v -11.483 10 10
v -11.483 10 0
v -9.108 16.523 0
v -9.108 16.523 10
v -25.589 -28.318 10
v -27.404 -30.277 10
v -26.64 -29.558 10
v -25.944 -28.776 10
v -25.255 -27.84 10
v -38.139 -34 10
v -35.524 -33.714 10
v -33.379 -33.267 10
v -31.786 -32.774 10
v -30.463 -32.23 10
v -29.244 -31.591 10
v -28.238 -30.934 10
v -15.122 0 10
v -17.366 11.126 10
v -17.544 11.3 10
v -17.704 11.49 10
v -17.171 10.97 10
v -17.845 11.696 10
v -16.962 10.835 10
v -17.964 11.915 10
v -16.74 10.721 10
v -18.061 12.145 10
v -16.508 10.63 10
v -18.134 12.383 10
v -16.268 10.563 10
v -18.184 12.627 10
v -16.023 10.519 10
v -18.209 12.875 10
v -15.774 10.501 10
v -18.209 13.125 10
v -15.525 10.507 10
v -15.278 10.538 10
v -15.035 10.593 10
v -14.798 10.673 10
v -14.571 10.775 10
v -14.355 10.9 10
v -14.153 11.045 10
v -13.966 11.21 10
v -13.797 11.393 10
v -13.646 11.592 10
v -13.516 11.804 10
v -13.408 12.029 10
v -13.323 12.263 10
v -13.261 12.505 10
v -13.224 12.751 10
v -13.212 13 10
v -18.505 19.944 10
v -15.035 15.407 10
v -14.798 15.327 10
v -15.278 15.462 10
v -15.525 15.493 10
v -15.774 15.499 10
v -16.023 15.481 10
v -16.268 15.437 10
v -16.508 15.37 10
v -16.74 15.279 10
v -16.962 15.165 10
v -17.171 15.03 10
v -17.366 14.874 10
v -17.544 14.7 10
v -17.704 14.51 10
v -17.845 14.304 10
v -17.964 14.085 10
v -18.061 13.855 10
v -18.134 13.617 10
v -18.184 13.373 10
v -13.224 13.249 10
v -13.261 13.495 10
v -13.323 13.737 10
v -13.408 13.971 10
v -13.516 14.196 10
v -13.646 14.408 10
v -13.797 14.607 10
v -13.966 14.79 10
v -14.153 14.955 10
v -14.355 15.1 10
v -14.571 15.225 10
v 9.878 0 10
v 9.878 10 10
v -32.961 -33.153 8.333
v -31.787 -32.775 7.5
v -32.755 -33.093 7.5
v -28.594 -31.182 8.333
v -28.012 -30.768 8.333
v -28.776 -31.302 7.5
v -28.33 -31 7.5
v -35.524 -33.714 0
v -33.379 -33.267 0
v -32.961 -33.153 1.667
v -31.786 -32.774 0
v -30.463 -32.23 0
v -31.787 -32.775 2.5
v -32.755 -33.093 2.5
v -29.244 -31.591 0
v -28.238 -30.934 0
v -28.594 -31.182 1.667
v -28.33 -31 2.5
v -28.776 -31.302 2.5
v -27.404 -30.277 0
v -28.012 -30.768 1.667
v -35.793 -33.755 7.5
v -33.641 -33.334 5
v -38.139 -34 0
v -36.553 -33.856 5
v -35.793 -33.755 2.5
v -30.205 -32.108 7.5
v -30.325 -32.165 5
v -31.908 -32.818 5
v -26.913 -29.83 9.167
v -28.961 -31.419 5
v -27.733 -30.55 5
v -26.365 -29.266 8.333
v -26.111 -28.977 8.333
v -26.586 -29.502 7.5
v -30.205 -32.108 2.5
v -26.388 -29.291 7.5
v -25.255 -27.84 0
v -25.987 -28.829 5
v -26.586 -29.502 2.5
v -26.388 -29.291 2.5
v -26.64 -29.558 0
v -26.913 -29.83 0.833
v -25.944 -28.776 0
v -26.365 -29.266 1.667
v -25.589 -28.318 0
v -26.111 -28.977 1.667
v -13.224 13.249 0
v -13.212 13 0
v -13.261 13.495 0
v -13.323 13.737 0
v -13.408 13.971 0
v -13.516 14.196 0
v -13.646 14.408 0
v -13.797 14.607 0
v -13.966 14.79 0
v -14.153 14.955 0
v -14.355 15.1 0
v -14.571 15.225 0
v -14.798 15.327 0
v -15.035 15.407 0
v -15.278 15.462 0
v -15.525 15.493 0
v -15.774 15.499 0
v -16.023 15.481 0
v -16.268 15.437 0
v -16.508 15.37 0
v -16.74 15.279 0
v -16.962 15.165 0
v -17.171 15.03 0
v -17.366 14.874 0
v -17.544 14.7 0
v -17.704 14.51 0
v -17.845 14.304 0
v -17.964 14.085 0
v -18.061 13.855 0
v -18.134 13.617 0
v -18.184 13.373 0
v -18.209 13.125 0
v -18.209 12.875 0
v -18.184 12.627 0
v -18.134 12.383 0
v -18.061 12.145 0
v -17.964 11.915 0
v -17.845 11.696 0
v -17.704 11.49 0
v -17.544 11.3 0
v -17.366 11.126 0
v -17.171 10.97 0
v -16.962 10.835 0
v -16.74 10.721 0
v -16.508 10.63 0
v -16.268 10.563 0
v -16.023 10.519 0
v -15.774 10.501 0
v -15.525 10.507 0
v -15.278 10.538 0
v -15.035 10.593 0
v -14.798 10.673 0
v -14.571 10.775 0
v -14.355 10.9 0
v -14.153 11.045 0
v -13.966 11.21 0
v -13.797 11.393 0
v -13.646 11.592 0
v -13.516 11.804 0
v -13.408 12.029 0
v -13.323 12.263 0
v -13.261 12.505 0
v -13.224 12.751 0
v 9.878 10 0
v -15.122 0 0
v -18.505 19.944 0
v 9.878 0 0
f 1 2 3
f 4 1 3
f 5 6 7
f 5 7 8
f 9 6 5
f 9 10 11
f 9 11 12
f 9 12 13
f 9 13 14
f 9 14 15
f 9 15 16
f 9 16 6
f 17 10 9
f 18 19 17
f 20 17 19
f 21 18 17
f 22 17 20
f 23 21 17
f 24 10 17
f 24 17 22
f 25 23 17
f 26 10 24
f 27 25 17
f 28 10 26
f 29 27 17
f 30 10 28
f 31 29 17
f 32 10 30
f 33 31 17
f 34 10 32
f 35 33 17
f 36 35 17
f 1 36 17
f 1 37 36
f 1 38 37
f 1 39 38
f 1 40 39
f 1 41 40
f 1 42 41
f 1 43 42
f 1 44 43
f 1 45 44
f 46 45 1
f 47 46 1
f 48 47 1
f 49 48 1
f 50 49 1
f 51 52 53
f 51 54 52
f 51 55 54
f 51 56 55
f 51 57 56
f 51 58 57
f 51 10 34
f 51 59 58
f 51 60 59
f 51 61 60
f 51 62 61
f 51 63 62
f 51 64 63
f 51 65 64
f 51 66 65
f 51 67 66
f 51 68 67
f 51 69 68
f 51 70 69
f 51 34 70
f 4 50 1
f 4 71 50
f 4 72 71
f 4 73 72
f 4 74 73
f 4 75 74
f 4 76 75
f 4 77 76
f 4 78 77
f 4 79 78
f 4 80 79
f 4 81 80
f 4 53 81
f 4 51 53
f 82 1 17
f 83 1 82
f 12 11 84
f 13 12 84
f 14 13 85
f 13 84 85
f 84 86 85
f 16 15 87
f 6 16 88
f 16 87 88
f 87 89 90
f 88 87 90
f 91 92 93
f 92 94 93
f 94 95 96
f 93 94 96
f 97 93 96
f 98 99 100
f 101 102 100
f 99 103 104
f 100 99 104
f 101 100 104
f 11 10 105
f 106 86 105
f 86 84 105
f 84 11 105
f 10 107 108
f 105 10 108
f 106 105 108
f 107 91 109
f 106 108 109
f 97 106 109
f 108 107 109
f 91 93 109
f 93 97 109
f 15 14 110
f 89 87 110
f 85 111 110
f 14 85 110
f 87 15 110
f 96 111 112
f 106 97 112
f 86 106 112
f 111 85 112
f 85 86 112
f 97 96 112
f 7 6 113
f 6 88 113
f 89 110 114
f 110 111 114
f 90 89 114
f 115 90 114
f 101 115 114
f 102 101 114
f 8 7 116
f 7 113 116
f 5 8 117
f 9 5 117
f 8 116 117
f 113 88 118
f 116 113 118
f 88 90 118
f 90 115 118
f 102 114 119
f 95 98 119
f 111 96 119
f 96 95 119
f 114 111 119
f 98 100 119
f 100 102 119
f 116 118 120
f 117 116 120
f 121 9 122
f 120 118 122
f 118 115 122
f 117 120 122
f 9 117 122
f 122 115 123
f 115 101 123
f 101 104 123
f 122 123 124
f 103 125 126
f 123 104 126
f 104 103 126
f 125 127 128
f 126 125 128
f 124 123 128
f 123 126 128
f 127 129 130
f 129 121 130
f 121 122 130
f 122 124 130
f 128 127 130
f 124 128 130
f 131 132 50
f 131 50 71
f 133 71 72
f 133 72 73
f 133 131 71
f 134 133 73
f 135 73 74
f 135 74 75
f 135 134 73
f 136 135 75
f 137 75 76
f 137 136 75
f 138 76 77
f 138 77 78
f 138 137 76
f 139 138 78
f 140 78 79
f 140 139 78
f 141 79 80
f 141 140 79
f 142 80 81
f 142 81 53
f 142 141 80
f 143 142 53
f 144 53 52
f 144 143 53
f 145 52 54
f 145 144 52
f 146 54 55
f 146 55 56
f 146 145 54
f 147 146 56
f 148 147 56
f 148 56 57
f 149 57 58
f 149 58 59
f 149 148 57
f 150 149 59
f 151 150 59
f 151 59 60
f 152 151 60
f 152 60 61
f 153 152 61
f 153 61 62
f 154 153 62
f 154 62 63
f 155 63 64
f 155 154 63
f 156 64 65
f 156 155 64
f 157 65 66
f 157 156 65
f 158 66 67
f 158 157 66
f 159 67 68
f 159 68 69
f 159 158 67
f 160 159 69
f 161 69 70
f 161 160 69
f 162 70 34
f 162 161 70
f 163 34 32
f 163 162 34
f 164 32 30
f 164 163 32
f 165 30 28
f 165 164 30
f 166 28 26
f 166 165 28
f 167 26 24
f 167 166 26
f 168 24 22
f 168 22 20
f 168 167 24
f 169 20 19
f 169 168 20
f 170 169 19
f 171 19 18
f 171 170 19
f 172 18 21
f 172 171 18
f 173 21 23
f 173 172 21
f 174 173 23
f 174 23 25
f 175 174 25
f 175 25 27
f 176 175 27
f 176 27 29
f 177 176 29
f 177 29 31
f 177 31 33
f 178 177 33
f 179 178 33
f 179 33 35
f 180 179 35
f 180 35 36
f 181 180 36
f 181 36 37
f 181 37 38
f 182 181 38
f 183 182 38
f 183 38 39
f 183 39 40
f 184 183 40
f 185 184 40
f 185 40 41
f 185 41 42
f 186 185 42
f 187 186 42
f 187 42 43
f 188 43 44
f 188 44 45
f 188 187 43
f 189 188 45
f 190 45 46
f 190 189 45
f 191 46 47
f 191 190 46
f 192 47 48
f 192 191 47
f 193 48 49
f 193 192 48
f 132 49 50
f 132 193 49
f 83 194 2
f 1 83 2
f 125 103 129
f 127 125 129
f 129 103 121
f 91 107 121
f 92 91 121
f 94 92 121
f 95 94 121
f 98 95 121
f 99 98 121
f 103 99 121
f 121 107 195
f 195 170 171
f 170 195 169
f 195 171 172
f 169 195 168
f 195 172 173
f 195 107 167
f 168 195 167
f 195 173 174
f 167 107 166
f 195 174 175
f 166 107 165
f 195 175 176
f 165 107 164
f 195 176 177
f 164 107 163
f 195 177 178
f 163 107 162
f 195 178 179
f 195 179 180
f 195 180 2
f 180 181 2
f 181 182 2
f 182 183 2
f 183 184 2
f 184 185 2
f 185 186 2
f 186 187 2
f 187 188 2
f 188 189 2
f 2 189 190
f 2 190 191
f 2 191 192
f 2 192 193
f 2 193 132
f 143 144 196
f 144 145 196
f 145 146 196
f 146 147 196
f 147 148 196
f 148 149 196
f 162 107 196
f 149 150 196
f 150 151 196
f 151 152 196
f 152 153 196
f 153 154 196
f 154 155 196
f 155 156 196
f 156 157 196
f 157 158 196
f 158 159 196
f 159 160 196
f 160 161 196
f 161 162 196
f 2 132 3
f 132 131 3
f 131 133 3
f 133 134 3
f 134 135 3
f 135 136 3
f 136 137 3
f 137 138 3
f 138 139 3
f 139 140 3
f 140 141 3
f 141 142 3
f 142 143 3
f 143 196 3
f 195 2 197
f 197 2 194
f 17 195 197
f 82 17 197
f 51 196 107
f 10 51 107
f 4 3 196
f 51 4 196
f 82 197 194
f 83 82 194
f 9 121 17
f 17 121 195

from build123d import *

# Parameters (mm, degrees)
SKETCH8_R           = 2.5
BOSS_EXTRUDE4_DEPTH = 10


with BuildPart() as part:
    # Sketch8 → Boss-Extrude4 (new body)
    with BuildSketch(Plane.XY):
        with BuildLine():
            Line((9.877608164, 0), (9.877608164, 10))
            Line((9.877608164, 10), (-11.482689494, 10))
            Line((-11.482689494, 10), (-9.108332934, 16.523491033))
            Line((-9.108332934, 16.523491033), (-18.505259142, 19.943692467))
            Line((-18.505259142, 19.943692467), (-38.139157526, -34))
            add(Edge.make_bspline(
                [(-38.139157526, -34), (-28.952640902, -33.410718861), (-25.255337047, -27.84003816)],
                knots=[0, 0, 0, 0.686191173, 0.686191173, 0.686191173], degree=2))
            Line((-25.255337047, -27.84003816), (-15.122391836, 0))
            Line((-15.122391836, 0), (9.877608164, 0))
        make_face()
        with Locations((-15.711667653, 13)):
            Circle(SKETCH8_R, mode=Mode.SUBTRACT)
    extrude(amount=BOSS_EXTRUDE4_DEPTH)


solid = part.part
